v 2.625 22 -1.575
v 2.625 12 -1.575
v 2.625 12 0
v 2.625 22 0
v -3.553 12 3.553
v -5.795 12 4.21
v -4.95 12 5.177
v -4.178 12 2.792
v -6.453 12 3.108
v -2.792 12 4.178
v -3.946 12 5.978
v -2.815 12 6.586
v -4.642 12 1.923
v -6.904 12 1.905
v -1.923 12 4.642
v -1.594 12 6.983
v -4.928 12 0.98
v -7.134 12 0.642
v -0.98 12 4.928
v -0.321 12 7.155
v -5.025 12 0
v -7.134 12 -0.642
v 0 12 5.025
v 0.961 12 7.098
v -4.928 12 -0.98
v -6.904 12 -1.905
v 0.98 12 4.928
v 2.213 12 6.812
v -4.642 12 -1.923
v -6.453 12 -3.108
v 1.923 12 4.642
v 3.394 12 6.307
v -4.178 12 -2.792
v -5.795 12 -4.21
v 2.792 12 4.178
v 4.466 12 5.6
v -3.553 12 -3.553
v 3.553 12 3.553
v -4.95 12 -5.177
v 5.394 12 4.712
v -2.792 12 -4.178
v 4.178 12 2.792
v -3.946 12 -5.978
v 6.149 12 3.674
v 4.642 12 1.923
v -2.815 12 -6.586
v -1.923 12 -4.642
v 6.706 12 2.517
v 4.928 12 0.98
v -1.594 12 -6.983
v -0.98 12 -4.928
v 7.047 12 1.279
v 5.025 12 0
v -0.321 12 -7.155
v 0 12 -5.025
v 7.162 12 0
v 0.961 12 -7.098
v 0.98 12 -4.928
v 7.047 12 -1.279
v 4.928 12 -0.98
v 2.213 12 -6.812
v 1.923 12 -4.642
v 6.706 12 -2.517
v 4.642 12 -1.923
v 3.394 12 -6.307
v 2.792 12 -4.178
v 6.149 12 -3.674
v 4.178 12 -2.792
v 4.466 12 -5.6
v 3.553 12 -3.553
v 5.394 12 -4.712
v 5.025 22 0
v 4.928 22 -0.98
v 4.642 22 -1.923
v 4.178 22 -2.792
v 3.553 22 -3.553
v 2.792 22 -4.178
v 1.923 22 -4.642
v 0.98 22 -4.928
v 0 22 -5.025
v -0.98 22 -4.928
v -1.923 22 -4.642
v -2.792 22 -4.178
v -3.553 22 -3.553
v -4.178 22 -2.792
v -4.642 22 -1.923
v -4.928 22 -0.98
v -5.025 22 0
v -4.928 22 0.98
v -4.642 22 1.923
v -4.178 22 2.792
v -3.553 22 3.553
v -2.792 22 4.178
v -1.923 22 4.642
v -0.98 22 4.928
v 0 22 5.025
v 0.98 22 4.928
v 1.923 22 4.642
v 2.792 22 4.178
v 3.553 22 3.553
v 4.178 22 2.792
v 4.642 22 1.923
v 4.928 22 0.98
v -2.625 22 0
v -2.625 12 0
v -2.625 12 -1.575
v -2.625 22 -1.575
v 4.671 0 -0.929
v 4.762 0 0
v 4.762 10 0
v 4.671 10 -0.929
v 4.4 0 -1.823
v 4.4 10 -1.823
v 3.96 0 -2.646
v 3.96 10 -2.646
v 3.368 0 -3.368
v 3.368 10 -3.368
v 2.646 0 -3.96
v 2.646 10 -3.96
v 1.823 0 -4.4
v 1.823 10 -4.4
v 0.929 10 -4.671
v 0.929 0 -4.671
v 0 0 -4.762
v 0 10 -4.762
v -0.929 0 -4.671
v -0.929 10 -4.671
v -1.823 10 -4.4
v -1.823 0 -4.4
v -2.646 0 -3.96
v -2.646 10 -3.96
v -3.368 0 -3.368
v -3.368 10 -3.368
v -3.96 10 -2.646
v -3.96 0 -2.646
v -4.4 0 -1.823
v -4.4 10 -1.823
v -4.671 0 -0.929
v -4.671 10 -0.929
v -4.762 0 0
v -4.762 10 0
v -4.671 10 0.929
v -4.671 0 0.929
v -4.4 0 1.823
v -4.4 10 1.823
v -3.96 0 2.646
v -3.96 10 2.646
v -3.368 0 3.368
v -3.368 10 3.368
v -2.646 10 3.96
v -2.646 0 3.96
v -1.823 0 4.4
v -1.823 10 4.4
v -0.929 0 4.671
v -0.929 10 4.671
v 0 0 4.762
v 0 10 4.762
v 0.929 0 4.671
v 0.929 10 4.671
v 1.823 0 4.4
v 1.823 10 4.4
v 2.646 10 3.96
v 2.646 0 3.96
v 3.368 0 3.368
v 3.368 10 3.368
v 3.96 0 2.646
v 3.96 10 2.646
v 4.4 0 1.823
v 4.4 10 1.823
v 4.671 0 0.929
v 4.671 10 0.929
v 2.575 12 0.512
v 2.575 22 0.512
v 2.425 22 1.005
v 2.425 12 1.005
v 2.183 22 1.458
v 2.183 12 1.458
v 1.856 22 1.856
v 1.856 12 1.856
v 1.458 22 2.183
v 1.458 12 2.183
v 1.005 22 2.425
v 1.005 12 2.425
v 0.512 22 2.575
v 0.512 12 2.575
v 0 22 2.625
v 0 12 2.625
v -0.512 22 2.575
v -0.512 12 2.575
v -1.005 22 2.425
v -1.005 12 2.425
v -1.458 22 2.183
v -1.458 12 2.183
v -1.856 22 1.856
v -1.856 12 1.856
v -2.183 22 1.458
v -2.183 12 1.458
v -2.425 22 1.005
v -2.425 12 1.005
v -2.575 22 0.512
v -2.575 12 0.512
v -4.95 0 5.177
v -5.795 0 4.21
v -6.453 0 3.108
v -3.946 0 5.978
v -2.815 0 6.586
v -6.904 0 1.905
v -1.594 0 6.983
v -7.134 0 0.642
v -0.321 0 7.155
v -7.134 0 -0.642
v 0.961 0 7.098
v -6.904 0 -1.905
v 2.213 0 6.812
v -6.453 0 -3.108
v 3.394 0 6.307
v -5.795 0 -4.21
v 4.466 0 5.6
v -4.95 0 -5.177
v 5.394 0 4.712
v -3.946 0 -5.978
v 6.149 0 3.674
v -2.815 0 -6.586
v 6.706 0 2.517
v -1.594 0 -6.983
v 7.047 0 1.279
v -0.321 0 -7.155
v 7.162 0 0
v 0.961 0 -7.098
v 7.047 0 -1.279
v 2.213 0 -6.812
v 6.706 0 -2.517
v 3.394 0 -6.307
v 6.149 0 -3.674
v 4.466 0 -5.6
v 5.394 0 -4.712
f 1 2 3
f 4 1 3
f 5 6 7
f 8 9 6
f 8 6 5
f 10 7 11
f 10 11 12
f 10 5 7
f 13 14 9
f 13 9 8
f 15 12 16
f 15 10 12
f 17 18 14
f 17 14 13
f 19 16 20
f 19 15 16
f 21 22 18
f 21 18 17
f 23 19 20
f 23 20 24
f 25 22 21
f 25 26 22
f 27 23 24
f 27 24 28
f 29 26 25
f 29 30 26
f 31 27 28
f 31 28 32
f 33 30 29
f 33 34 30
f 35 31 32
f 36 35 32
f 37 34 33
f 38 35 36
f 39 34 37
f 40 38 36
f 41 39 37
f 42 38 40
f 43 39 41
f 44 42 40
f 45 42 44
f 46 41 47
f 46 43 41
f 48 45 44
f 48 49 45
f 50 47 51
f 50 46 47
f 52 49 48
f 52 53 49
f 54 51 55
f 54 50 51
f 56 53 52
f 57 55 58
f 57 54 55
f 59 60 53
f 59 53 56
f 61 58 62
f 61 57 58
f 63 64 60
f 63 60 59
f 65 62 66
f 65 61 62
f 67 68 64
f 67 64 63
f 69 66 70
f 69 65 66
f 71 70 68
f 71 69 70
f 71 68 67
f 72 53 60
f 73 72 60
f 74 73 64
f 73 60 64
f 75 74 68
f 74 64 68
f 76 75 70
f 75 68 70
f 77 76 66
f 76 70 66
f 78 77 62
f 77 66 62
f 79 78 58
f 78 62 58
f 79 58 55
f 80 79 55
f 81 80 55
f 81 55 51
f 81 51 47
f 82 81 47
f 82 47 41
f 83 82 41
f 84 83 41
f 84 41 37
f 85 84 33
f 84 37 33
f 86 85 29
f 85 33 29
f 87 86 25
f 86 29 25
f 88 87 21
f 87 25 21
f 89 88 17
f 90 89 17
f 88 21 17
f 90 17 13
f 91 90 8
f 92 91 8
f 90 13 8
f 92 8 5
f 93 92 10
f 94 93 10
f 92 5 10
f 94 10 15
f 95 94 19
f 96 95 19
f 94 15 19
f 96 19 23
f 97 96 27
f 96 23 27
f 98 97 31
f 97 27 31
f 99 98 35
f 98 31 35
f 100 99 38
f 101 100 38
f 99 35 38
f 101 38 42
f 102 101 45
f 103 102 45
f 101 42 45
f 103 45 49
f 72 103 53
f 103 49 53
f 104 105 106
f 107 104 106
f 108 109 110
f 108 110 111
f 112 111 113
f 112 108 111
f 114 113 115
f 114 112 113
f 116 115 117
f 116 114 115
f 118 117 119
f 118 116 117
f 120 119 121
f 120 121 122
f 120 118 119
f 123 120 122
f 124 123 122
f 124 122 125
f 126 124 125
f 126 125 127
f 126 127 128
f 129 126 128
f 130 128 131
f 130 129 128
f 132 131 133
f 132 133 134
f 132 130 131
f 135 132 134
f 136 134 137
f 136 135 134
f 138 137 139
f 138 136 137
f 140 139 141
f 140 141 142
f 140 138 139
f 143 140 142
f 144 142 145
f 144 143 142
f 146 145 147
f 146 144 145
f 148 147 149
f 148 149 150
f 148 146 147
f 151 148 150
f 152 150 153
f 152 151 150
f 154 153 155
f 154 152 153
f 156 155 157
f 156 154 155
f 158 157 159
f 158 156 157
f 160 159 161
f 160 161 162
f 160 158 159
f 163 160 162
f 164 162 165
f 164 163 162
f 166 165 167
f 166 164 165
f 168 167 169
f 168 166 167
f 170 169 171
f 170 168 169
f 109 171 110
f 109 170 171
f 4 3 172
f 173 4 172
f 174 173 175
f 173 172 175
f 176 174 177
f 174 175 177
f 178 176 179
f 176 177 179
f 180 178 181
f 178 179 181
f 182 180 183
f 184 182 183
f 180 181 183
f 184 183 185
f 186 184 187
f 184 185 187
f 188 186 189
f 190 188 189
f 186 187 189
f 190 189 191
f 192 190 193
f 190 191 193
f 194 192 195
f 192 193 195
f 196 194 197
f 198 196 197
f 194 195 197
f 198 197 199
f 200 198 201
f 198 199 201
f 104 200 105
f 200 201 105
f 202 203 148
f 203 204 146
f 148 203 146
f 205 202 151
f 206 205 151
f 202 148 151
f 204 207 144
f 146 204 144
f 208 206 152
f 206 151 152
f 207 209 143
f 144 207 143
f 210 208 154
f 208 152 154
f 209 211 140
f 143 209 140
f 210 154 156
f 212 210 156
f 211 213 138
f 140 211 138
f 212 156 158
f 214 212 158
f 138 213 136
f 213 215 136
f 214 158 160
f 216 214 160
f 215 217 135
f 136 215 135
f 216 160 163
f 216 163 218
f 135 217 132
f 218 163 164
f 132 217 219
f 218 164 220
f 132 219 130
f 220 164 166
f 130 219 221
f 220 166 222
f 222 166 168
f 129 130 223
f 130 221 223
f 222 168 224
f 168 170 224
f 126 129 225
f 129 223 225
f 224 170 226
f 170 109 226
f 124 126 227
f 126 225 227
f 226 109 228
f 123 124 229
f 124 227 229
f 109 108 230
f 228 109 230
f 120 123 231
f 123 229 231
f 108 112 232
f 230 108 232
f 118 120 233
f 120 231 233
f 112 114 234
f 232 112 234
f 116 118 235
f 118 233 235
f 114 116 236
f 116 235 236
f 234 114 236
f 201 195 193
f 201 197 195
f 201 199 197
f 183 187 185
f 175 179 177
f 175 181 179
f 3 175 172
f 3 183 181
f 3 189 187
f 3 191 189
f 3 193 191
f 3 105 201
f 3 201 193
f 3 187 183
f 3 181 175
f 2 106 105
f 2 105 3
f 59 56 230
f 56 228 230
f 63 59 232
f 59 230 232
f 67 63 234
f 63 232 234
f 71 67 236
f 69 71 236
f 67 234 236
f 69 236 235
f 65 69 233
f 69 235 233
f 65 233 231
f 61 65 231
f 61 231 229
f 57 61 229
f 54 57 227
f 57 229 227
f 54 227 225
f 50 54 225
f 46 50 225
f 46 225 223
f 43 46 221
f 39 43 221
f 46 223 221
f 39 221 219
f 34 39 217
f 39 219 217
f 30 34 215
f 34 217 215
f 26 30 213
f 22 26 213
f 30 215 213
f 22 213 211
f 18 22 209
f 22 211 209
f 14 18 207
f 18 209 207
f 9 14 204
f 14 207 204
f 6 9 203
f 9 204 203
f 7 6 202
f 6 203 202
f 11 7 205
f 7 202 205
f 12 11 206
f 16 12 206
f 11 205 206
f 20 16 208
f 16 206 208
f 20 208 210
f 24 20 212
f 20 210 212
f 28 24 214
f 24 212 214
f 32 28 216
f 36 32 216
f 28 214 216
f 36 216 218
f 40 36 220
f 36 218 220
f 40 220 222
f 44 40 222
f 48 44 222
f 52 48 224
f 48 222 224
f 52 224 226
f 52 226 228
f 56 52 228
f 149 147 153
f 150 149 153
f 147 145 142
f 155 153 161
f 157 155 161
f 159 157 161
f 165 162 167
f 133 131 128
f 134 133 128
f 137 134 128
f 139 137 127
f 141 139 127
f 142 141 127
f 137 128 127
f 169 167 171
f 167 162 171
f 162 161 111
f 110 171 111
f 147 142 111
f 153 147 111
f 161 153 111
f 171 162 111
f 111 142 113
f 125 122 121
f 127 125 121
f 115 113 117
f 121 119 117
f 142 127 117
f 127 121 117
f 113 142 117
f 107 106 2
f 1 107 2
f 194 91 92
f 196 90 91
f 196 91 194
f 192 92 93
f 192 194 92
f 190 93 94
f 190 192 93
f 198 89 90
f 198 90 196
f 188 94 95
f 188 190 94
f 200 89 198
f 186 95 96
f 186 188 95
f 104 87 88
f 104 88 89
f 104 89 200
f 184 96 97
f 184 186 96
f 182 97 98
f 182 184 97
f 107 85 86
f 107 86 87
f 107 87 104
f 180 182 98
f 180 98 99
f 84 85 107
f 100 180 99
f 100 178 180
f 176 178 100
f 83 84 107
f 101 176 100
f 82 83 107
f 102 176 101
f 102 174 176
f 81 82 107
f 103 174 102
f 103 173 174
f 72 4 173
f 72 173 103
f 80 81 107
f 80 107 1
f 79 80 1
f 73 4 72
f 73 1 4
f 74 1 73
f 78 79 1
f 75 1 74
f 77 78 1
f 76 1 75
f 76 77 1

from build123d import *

# Parameters (mm, degrees)
SKETCH1_R           = 7.1625
SKETCH1_R_2         = 4.7625
BOSS_EXTRUDE1_DEPTH = 10
SKETCH2_R           = 7.1625
SKETCH2_R_2         = 4.7625
BOSS_EXTRUDE2_DEPTH = 2
SKETCH3_R           = 5.025
BOSS_EXTRUDE3_DEPTH = 10


with BuildPart() as part:
    # Sketch1 → Boss-Extrude1 (new body)
    with BuildSketch(Plane(origin=(0, 0, 0), x_dir=(1, 0, 0), z_dir=(0, 1, 0))):
        Circle(SKETCH1_R)
        Circle(SKETCH1_R_2, mode=Mode.SUBTRACT)
    extrude(amount=BOSS_EXTRUDE1_DEPTH)

    # Sketch2 → Boss-Extrude2 (add)
    with BuildSketch(Plane(origin=(0, 10, 0), x_dir=(1, 0, 0), z_dir=(0, 1, 0))):
        Circle(SKETCH2_R)
        Circle(SKETCH2_R_2, mode=Mode.SUBTRACT)
        Circle(SKETCH2_R_2)
    extrude(amount=BOSS_EXTRUDE2_DEPTH)

    # Sketch3 → Boss-Extrude3 (add)
    with BuildSketch(Plane(origin=(0, 12, 0), x_dir=(1, 0, 0), z_dir=(0, 1, 0))):
        Circle(SKETCH3_R)
        with BuildLine():
            Line((-2.625, 0), (-2.625, 1.575))
            Line((-2.625, 1.575), (2.625, 1.575))
            Line((2.625, 1.575), (2.625, 0))
            ThreePointArc((2.625, 0), (0, -2.625), (-2.625, 0))
        make_face(mode=Mode.SUBTRACT)
    extrude(amount=BOSS_EXTRUDE3_DEPTH)


solid = part.part
